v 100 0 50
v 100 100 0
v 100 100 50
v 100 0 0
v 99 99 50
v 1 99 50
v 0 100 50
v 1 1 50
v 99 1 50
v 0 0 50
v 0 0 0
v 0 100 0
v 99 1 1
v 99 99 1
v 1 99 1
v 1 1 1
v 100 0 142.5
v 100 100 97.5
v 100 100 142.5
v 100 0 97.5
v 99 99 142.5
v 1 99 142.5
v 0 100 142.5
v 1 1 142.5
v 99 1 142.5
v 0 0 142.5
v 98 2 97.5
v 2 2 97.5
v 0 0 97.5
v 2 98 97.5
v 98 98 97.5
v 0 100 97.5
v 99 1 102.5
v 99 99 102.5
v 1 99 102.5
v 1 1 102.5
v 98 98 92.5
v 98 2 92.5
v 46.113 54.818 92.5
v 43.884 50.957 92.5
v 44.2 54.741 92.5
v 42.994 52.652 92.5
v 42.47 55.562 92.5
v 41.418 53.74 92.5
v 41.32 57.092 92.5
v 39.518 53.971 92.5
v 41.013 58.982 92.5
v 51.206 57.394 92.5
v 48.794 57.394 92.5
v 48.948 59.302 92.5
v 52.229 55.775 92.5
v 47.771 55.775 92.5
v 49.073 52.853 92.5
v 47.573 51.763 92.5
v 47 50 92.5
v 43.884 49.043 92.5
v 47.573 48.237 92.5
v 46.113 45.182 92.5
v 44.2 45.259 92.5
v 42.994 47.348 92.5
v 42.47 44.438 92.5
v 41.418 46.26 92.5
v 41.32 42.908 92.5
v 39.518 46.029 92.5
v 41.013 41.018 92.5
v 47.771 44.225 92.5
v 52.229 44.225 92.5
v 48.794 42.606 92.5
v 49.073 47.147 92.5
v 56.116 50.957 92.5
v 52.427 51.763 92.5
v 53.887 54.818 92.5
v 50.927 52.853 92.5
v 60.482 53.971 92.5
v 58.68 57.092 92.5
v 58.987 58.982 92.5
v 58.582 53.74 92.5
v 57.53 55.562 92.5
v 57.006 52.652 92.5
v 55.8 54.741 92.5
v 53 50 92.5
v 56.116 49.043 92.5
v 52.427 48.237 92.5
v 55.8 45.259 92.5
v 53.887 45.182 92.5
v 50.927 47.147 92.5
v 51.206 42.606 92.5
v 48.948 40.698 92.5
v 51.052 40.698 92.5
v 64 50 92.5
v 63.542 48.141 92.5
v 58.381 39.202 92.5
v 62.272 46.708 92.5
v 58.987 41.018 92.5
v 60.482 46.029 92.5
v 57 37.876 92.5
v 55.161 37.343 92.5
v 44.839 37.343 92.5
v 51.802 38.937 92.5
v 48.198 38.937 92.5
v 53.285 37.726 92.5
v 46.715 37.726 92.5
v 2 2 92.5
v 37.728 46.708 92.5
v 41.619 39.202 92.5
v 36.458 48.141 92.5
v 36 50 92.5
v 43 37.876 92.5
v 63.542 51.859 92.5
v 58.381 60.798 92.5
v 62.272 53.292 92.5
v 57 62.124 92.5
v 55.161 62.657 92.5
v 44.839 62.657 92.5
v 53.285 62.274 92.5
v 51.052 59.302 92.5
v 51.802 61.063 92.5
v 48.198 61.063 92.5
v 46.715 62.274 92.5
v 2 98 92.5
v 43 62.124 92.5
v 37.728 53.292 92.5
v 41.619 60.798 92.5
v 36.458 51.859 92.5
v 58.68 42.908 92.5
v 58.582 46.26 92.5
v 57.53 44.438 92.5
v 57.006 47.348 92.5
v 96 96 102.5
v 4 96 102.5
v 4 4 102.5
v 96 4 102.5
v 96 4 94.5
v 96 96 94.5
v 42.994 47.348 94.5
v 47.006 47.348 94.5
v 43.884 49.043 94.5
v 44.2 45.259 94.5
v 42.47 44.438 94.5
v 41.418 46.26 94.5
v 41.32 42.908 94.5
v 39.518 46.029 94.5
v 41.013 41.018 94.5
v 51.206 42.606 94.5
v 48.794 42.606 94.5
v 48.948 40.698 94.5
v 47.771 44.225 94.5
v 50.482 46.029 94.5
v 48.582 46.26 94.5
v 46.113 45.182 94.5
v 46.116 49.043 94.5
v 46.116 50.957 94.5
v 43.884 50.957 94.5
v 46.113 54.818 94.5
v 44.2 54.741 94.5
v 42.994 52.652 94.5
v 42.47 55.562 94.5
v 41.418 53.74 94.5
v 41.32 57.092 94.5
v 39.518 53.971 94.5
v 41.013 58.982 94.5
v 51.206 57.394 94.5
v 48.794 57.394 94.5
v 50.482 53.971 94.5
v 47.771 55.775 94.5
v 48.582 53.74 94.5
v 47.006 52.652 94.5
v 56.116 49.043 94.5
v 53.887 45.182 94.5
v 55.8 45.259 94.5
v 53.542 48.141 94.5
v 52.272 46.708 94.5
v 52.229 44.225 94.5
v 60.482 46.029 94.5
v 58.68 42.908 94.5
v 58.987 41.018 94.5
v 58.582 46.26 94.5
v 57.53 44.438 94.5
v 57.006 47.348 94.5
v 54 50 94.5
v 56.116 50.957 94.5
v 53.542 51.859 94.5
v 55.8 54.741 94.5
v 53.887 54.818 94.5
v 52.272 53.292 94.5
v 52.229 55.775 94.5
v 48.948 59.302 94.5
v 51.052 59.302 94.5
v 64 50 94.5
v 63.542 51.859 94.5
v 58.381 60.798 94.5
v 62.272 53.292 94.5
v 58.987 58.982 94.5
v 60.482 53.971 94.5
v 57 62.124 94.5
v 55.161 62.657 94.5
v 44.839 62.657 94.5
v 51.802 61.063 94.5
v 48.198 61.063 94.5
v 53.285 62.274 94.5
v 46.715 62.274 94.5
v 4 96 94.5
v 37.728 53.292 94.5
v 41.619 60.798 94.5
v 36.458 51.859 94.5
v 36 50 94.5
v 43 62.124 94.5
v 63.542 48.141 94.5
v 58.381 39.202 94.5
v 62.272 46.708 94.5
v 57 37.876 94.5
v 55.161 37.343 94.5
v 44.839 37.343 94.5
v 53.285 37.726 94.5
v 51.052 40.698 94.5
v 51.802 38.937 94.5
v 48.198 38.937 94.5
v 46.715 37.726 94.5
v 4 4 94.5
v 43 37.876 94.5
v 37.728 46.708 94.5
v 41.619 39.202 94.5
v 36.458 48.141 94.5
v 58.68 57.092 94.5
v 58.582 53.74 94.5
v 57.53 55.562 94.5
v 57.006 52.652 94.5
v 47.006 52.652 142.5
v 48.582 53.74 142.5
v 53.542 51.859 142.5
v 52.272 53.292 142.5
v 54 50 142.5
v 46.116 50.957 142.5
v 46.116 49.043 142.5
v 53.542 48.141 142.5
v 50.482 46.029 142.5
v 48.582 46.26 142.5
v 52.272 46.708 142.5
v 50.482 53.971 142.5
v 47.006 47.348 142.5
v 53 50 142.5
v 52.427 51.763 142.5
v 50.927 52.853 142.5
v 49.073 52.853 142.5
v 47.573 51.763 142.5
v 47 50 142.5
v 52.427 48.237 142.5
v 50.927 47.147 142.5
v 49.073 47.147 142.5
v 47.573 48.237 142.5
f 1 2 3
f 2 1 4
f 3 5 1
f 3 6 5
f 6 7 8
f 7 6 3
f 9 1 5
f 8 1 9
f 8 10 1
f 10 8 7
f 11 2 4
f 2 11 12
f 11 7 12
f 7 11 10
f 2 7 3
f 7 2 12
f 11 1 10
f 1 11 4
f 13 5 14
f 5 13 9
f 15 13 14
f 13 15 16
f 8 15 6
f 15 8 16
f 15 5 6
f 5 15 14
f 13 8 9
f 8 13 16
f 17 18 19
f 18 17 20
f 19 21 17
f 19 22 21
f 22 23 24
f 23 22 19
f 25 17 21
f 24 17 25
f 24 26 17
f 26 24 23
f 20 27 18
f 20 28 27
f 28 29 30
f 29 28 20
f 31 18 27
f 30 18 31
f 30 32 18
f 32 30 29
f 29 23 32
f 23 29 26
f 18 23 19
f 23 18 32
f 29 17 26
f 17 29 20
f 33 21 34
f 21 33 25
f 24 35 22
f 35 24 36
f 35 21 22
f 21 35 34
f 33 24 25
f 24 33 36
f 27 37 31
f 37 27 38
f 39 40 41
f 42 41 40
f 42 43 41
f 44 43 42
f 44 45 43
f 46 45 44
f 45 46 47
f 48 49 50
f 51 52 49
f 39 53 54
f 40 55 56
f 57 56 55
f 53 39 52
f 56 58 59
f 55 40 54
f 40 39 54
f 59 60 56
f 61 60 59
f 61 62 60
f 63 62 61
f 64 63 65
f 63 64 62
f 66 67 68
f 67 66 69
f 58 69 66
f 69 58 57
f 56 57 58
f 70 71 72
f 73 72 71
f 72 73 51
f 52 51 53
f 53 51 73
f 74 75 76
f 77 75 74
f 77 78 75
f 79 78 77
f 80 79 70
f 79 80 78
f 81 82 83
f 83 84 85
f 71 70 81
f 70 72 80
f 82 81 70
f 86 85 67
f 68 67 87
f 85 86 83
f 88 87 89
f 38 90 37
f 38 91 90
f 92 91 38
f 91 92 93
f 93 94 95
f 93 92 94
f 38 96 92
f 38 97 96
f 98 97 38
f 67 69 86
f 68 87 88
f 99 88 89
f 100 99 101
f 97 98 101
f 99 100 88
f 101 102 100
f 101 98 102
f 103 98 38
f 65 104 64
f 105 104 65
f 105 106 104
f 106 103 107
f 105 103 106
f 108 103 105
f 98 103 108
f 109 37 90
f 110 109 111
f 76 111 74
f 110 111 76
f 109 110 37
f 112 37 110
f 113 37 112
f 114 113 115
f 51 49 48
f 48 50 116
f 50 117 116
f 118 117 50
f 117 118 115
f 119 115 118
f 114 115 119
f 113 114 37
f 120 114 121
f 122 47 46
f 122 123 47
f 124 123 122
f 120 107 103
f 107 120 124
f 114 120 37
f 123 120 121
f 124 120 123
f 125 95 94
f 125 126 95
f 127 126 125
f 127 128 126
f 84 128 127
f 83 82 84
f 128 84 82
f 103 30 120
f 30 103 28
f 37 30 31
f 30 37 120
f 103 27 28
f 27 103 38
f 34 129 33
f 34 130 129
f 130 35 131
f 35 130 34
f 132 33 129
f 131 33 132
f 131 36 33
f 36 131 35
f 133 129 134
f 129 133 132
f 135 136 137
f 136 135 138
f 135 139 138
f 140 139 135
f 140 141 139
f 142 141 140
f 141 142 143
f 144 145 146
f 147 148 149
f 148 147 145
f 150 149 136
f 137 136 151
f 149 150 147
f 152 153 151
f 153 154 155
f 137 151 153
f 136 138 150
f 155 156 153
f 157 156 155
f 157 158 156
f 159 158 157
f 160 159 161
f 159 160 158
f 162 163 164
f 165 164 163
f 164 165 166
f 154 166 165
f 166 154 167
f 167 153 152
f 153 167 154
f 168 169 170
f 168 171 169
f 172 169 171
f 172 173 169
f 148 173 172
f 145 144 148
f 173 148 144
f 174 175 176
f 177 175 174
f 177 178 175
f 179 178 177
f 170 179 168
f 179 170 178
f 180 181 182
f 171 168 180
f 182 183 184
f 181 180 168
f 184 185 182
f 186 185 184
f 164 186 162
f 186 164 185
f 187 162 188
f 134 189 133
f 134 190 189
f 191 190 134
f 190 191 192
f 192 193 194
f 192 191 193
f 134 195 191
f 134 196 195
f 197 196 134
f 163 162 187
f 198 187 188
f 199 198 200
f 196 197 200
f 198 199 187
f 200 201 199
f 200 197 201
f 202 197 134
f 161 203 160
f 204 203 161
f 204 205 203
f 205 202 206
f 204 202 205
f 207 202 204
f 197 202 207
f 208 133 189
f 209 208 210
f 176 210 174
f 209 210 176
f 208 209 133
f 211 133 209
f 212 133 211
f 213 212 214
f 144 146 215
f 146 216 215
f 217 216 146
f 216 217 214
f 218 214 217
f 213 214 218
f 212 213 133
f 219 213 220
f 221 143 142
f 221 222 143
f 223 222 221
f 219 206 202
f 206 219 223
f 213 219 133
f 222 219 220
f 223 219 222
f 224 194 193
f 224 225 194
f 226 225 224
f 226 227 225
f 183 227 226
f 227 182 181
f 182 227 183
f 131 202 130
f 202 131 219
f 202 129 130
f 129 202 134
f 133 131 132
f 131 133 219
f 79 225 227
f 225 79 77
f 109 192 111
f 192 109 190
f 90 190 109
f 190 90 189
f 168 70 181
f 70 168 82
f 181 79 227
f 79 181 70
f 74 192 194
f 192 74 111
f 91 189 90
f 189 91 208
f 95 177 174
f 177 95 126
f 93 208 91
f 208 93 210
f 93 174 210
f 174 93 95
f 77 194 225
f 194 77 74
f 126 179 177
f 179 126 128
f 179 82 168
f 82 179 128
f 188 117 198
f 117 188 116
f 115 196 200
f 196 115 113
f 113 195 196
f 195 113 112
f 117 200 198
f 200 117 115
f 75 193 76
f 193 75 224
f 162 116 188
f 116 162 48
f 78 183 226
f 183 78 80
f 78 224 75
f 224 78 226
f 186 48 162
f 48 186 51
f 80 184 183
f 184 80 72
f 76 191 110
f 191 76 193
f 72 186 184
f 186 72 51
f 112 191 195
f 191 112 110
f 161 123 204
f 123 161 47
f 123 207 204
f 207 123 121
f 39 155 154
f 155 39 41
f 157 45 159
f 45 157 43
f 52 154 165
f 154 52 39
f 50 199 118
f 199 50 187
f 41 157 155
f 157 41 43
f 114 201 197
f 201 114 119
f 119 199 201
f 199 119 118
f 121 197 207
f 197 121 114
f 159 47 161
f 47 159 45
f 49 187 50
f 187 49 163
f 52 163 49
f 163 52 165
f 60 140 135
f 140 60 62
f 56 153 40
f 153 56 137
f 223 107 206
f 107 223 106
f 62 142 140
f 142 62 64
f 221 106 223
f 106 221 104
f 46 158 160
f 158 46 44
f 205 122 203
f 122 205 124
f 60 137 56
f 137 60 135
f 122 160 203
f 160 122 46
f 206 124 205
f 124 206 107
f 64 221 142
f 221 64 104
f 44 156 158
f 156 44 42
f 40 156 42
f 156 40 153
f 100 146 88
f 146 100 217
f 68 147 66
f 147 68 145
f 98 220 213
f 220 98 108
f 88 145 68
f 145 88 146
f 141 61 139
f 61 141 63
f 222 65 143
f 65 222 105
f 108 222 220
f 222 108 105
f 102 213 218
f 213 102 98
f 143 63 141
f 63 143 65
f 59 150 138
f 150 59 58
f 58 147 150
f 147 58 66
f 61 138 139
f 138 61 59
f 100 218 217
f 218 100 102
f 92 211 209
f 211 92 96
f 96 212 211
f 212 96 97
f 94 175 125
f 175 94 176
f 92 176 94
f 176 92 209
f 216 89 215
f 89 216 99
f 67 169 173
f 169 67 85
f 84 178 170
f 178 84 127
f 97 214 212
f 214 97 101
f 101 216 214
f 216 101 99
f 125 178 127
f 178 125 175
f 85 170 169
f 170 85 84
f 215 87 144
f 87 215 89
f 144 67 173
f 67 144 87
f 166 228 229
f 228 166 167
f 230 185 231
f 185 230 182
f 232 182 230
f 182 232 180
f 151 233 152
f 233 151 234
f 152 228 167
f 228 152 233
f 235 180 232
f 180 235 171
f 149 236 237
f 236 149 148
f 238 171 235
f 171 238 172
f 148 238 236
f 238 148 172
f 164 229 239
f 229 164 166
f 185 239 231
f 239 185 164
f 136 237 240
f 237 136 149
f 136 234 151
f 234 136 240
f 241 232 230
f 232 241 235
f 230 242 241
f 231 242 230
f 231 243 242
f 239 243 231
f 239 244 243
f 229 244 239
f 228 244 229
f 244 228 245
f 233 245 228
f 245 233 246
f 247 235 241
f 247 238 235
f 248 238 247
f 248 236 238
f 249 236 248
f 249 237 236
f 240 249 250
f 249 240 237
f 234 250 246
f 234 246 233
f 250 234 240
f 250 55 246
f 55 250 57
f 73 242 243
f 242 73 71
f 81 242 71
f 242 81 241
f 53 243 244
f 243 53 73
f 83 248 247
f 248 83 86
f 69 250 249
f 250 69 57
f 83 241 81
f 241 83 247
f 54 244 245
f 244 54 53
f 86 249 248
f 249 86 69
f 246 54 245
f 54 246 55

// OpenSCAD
// Square hydro-wicked planter.
// Size customizable via below parameters

// << Parameters >>

$width = 100;
$depth = 100;
$height = 50;

$margin = 2;

$connection = 5;

$hole_dia = 4;

$show_present = true;
$show_print_basin = false;
$show_print_planter = false;

// << Modules >>

module basin() {
  color("cyan") difference() {
    cube(size = [ $width, $depth, $height ], center = true);

    // DIFF
    translate([ 0, 0, $margin ])
        cube(size = [ $width - $margin, $depth - $margin, $height + $margin ],
             center = true);
  }
}

module planter() {
  union() {
    difference() {
      difference() {
        union() {
          // Top part of planter
          color("lime") difference() {
            cube(size = [ $width, $depth, $height - $connection ],
                 center = true);

            // DIFF
            translate([ 0, 0, $margin ]) cube(
                size =
                    [ $width - $margin, $depth - $margin, $height + $margin ],
                center = true);
          }

          // Bottom connector
          color("tomato") translate([ 0, 0, -($height / 2) ]) {
            union() {
              // Connector part
              cube(size =
                       [
                         $width - $margin * 2, $depth - $margin * 2,
                         $connection
                       ],
                   center = true);

              // Connecting bit to outer shell
              translate([ 0, 0, $connection ])
                  cube(size = [ $width, $depth, $connection ], center = true);
            }
          }
        }
        // DIFF
        translate([ 0, 0, -$height / 2 + $margin * 2 ])
            cube(size =
                     [
                       $width - $margin * 4, $depth - $margin * 4,
                       $connection + $margin * 2
                     ],
                 center = true);
      }

      // Drainage holes
      translate([ 0, 0, -$height ]) cylinder($height, $hole_dia, $hole_dia);
      for (i = [0:5]) {
        rotate([ 0, 0, 360 / 6 * i ])
            translate([ $hole_dia * 2 + $margin, 0, -$height ])
                cylinder($height, $hole_dia, $hole_dia);
      }
    }

    color("violet") translate([ 0, 0, -$height / 2 - $margin * 1.25 ]) {
      difference() {
        cylinder($height, $hole_dia, $hole_dia);
        translate([ 0, 0, -$margin ])
            cylinder($height + $margin * 2, $hole_dia - $margin * 0.5,
                     $hole_dia - $margin * 0.5);
      }
    }
  }
}

// << Presenting >>

if ($t != undef) {
  // Animation!

  translate([ $width / 2, $depth / 2, $height / 2 ]) basin();
  translate([
    $width / 2, $depth / 2,
    $height / 2 + $height - $connection + $height - $height *
    $t
  ]) planter();
} else {
  // STL

  if ($show_print_basin) {
    basin();
  }

  if ($show_print_planter) {
    planter();
  }
}

// TODO: Floater
